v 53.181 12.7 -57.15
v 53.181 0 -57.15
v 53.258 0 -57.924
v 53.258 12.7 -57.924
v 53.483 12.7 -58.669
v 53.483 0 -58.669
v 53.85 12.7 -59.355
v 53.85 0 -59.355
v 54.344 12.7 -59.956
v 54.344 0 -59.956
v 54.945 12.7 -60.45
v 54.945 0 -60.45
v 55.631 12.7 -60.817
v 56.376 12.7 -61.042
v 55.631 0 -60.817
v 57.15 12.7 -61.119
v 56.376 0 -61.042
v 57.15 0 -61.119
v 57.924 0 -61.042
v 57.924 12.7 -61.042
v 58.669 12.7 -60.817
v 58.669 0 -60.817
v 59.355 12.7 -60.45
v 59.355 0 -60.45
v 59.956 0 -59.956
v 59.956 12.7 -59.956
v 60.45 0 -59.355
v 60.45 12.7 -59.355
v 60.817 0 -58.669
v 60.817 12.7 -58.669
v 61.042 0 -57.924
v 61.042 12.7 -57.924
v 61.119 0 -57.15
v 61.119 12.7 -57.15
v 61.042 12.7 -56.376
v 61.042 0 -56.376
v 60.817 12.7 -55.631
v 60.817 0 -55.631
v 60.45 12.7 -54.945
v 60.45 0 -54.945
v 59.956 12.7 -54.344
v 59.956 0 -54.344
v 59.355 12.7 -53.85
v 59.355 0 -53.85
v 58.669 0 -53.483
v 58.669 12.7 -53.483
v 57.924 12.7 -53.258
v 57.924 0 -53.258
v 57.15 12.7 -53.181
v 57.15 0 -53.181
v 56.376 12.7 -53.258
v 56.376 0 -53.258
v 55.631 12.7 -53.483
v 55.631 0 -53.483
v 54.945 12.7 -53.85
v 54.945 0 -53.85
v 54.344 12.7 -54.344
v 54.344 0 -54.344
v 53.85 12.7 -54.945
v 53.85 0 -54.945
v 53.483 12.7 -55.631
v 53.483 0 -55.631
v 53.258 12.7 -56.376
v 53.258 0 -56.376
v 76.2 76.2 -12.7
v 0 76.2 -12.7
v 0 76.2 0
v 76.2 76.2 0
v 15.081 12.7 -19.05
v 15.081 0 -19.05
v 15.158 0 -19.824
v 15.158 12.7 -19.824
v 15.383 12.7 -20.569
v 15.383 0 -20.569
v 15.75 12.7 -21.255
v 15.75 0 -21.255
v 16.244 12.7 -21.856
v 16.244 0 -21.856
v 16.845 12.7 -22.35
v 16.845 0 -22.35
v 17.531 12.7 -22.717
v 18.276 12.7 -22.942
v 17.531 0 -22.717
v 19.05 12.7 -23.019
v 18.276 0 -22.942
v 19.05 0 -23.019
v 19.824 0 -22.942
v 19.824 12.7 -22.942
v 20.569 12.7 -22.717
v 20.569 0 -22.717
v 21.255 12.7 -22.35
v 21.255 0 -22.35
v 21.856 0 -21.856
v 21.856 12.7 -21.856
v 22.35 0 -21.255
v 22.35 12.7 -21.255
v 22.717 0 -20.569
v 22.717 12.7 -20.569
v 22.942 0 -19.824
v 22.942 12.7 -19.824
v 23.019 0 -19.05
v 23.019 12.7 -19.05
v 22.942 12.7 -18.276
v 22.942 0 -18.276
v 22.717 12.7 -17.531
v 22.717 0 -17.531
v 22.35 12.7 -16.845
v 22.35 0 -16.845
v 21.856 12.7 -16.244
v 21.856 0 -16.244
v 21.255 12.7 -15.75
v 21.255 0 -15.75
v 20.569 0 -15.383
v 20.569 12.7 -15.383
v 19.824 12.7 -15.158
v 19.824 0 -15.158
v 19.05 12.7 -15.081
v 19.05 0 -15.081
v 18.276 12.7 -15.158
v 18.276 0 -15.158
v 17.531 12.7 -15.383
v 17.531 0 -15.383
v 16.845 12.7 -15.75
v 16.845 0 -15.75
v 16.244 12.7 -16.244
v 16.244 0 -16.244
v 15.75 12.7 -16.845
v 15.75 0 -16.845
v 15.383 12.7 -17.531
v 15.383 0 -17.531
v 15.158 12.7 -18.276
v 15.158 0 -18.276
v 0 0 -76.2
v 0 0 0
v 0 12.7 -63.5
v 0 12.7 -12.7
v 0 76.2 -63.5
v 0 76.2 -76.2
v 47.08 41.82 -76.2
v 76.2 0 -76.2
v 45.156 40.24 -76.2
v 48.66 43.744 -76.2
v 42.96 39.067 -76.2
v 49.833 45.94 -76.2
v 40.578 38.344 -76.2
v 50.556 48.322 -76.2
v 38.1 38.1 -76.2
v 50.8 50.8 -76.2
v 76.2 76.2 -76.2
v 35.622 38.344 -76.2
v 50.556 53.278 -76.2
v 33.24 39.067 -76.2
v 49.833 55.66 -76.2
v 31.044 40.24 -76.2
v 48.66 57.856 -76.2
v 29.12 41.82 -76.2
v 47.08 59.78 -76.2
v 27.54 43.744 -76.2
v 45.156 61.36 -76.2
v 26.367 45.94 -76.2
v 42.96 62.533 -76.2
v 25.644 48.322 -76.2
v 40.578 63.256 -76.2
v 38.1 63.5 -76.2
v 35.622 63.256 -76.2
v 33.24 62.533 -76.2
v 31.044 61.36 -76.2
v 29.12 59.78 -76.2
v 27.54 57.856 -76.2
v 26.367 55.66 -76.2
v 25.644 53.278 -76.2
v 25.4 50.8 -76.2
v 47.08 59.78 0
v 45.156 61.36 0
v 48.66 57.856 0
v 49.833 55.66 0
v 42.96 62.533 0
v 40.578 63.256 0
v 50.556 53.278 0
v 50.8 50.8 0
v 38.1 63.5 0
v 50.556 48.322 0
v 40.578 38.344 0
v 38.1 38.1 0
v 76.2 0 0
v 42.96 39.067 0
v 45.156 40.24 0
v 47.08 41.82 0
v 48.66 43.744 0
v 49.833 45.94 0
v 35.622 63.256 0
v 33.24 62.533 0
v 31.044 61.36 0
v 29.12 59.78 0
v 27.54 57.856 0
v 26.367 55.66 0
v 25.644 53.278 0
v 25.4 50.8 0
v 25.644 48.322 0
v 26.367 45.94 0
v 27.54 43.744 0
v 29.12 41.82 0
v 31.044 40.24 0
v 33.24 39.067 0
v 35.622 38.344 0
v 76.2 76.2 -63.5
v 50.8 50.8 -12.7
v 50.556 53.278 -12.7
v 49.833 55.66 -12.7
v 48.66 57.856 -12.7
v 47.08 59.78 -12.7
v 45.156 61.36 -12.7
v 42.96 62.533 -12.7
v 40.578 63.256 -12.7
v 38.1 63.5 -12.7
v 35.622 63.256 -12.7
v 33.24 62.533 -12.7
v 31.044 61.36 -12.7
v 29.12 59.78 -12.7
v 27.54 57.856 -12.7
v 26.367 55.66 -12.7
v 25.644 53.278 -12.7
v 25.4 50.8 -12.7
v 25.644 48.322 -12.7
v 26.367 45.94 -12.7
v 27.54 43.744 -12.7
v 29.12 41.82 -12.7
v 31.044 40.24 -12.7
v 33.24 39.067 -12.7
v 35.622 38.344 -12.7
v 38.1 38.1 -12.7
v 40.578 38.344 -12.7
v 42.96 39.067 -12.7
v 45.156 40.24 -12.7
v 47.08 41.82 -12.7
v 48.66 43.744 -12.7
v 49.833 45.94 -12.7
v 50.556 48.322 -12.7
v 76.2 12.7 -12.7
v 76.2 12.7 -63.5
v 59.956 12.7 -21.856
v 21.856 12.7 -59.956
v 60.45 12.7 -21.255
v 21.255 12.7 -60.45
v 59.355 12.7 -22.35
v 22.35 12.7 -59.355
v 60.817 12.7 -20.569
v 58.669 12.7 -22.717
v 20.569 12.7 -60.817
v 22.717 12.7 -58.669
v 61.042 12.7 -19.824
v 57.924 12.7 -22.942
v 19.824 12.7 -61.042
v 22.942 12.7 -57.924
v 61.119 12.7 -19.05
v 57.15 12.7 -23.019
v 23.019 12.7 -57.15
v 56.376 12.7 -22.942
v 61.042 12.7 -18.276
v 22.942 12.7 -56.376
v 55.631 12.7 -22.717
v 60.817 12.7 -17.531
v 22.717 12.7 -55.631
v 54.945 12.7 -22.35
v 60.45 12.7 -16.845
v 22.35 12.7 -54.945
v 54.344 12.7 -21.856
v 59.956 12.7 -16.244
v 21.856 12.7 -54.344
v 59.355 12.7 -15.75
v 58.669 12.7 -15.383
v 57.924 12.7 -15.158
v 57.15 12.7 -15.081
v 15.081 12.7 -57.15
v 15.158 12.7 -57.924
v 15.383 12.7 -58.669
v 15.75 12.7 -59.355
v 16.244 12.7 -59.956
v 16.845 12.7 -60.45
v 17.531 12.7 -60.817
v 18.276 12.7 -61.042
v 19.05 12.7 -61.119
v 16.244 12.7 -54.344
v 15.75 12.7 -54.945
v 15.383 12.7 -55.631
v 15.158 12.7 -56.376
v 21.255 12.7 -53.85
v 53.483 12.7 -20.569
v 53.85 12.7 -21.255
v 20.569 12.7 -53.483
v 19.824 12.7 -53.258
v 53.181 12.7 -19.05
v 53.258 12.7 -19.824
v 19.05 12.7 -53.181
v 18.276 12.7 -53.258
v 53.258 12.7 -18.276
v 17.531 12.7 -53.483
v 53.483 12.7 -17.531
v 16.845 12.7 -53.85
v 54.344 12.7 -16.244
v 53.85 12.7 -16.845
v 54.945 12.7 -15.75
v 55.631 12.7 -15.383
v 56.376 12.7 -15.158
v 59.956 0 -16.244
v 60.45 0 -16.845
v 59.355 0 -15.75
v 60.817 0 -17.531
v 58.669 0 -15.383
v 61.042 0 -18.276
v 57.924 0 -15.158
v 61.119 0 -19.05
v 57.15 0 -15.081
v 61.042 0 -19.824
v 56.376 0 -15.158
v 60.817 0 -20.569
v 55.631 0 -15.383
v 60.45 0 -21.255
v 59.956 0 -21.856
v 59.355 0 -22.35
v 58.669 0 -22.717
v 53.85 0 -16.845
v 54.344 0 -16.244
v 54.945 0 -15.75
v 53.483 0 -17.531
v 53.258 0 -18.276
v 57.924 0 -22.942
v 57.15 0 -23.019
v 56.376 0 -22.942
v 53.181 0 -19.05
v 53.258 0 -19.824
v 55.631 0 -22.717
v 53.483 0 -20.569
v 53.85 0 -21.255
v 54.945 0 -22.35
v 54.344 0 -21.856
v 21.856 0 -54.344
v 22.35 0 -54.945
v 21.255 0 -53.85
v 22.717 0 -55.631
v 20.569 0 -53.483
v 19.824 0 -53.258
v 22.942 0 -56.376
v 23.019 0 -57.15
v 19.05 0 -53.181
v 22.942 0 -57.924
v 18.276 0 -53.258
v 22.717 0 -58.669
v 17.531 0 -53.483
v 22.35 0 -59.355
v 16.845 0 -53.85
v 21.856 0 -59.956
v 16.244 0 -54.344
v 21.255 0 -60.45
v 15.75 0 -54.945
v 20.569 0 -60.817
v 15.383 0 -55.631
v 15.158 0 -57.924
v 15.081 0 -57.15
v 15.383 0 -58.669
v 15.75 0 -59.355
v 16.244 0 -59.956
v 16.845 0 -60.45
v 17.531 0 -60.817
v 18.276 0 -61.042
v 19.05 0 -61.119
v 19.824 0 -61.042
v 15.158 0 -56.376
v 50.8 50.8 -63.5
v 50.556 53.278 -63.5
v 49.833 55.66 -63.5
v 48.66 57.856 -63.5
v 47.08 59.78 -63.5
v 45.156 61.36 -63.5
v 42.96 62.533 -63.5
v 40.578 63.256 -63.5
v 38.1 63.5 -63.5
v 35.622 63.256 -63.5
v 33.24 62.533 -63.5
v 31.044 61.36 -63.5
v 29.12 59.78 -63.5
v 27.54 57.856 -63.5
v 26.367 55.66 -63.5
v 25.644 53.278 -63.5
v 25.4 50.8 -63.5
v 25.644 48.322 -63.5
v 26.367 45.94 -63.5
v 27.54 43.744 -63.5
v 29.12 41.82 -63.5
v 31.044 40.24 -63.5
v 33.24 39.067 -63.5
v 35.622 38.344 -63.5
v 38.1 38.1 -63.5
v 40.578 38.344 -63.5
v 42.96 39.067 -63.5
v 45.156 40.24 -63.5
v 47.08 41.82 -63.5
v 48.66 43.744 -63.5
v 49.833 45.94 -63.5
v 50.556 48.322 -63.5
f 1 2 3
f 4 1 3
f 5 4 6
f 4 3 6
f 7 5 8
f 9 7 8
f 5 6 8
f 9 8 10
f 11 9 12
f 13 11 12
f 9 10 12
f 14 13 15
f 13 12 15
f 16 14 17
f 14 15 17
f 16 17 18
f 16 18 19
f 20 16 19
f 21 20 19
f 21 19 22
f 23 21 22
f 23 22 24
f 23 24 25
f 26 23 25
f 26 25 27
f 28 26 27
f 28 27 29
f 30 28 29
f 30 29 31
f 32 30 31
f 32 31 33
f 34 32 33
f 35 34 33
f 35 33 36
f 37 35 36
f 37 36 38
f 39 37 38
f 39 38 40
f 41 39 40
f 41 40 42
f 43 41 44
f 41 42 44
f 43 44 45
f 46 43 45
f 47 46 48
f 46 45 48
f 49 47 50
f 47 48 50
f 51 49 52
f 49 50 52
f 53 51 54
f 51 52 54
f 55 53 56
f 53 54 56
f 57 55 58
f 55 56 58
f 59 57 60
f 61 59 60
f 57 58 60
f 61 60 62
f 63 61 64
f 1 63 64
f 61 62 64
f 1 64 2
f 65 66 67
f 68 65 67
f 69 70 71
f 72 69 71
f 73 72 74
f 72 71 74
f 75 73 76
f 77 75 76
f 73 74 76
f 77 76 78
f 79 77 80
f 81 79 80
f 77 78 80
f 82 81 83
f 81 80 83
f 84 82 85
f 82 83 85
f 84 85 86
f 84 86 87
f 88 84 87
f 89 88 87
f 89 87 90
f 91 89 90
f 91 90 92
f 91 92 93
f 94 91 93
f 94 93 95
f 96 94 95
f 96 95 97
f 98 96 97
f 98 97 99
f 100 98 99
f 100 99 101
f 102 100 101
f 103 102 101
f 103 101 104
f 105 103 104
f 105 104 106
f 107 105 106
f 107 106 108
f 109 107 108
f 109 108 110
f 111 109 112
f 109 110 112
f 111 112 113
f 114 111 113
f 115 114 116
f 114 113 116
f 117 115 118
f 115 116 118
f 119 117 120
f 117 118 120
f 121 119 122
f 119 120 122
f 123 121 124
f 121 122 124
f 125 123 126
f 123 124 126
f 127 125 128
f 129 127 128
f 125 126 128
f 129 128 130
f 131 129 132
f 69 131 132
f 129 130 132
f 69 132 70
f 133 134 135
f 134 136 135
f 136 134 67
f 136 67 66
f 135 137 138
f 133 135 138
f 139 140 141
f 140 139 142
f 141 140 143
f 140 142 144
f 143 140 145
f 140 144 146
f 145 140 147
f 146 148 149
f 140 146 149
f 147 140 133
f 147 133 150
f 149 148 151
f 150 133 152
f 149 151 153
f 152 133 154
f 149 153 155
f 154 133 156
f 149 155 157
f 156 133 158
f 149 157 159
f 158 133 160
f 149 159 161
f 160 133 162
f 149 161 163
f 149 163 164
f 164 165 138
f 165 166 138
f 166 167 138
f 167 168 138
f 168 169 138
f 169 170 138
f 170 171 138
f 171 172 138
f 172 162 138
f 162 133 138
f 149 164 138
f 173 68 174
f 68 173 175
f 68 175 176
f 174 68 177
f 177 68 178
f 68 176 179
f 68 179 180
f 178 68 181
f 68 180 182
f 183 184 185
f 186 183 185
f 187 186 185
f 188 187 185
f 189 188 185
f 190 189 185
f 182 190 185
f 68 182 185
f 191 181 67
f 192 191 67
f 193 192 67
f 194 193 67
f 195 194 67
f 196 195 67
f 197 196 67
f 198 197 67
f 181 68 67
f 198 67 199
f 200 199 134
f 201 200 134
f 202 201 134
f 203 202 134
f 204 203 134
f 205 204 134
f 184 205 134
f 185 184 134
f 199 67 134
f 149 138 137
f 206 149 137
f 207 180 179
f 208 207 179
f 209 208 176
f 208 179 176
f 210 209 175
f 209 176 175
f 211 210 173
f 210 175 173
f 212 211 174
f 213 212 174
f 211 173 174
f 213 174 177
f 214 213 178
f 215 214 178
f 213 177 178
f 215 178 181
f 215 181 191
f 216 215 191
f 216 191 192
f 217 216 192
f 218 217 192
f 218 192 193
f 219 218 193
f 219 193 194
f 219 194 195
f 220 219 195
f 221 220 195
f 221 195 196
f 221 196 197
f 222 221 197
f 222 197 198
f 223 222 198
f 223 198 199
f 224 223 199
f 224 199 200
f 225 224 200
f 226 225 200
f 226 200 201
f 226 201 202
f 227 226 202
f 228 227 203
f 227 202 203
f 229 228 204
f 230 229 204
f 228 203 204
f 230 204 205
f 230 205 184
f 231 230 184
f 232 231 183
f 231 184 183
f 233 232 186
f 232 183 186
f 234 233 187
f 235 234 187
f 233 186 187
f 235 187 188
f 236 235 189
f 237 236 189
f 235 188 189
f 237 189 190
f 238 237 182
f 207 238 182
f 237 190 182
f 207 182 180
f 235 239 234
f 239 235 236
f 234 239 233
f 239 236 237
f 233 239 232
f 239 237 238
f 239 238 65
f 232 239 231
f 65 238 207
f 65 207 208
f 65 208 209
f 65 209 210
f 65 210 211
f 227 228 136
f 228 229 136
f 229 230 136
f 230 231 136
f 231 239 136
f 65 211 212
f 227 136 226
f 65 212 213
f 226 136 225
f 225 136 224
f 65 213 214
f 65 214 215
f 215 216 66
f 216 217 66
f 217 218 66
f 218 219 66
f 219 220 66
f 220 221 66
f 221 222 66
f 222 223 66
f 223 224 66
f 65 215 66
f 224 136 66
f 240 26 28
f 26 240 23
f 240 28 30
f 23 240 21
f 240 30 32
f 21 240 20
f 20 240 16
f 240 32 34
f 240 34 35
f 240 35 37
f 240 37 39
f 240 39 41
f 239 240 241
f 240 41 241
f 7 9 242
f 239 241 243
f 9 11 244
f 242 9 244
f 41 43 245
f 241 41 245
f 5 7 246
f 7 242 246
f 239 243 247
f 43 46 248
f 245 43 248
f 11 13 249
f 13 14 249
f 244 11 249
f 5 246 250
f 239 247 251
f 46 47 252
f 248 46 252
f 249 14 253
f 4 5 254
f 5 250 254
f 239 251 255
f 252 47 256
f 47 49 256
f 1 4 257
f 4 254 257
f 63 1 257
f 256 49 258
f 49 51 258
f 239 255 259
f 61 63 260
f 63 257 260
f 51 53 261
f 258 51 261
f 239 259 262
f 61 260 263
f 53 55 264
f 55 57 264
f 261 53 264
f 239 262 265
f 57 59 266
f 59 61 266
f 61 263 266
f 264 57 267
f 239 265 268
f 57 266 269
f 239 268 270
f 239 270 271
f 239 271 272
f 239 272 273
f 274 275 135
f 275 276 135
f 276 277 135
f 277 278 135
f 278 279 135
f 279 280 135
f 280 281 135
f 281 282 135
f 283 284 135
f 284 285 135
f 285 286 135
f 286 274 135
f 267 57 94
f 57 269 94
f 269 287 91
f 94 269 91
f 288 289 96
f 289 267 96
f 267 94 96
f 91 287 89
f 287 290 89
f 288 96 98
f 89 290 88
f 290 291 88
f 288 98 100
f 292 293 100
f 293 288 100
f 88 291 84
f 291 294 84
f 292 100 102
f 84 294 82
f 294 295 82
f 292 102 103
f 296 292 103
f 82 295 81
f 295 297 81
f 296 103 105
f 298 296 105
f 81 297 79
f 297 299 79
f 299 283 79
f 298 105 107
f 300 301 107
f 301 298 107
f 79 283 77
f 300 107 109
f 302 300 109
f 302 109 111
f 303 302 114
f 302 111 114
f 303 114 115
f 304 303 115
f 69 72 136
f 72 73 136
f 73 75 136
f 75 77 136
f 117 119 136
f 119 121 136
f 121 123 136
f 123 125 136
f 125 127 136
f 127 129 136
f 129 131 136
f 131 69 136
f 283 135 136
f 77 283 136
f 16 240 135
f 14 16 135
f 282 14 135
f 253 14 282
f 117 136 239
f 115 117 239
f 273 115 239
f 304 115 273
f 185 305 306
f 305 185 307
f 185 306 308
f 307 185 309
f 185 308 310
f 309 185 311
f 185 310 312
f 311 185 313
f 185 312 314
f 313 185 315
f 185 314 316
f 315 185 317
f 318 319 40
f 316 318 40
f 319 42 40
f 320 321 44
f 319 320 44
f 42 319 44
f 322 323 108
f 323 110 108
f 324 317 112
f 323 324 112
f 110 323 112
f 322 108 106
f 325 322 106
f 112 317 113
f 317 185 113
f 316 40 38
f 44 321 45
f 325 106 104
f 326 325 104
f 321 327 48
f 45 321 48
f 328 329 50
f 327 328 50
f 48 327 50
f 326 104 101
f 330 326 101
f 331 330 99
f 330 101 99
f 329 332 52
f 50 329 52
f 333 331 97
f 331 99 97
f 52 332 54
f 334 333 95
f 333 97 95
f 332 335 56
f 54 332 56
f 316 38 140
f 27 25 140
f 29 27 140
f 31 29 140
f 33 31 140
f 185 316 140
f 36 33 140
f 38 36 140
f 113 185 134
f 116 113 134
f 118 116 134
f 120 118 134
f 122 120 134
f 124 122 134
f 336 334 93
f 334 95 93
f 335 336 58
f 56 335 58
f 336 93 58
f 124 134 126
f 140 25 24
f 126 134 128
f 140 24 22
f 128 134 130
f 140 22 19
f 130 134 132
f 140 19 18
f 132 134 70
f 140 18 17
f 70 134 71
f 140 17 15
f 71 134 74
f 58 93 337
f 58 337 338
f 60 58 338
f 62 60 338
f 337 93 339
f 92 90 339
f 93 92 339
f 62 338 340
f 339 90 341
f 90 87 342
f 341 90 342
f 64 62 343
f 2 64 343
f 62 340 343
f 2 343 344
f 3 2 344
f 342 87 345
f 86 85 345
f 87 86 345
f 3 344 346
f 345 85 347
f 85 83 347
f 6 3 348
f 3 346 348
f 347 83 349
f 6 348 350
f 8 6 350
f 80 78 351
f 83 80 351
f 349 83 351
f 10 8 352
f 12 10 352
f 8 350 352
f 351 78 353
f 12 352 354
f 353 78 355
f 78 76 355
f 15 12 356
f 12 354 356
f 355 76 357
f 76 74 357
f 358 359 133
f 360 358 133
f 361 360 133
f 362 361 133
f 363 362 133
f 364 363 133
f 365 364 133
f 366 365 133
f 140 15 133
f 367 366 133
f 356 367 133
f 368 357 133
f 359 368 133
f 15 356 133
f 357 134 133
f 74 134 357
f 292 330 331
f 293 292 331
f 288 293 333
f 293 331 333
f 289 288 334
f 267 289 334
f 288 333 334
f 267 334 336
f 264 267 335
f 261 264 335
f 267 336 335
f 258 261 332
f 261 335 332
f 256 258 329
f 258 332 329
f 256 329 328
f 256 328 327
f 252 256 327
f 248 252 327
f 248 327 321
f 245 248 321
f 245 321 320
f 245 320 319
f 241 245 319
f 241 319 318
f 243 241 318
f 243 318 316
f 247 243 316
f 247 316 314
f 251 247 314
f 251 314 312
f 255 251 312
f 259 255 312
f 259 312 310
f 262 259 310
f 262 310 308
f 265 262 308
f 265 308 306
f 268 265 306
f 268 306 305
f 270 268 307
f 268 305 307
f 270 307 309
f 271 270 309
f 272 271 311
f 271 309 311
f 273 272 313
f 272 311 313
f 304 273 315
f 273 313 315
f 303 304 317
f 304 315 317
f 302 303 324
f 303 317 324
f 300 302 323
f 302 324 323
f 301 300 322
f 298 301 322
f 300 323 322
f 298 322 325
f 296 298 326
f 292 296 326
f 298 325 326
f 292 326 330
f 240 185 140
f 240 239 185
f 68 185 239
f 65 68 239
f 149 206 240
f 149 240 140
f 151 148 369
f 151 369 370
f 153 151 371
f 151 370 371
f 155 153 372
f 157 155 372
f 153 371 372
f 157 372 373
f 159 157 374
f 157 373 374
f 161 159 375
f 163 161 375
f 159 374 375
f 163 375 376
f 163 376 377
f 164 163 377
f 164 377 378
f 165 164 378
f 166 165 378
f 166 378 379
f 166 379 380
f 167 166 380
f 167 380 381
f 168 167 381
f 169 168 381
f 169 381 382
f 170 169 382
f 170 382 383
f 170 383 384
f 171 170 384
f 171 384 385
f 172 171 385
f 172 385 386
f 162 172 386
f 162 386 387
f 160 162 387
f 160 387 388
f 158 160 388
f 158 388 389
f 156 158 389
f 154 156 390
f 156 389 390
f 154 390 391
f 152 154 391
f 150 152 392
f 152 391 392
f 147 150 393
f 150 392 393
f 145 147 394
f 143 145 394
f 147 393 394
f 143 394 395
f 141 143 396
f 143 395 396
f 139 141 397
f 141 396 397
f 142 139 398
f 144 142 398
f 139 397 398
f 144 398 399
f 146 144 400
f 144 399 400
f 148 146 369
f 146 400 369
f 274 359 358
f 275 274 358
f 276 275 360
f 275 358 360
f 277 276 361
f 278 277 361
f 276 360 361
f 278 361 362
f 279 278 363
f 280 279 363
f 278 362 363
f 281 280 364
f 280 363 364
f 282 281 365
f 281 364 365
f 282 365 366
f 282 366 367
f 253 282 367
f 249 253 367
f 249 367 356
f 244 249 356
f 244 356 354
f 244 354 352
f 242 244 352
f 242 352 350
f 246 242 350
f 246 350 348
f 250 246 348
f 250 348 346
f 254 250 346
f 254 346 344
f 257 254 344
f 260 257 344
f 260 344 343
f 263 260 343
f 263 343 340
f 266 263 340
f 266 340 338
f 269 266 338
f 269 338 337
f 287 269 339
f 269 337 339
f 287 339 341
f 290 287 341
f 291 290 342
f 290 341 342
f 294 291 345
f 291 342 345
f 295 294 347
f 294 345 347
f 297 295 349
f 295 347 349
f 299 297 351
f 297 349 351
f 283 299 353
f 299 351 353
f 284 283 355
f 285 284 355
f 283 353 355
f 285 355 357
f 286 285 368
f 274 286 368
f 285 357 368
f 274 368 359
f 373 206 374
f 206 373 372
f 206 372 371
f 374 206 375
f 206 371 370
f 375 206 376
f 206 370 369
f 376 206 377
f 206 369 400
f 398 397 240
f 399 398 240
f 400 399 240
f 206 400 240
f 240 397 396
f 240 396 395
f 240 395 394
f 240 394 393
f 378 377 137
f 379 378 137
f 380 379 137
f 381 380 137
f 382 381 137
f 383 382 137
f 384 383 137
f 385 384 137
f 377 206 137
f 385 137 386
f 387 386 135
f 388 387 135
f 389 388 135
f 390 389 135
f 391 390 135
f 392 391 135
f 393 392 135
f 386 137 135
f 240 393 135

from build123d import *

# Parameters (mm, degrees)
BOSS_EXTRUDE1_DEPTH            = 76.2
SKETCH2_R                      = 12.7
CUT_EXTRUDE1_DEPTH             = 132.982271537
F_5_16_0_3125_DIAMETER_HOLE1_D = 7.9375
LPATTERN1_COUNT                = 2
LPATTERN1_PITCH                = 38.1
LPATTERN1_COUNT_DIR2           = 2
LPATTERN1_PITCH_DIR2           = 38.1


with BuildPart() as part:
    # Sketch1 → Boss-Extrude1 (new body)
    with BuildSketch(Plane(origin=(0, 0, 0), x_dir=(0, 0, -1), z_dir=(1, 0, 0))):
        Polygon((0, 0), (76.2, 0), (76.2, 76.2), (63.5, 76.2), (63.5, 12.7), (12.7, 12.7), (12.7, 76.2), (0, 76.2), align=None)
    extrude(amount=BOSS_EXTRUDE1_DEPTH)

    # Sketch2 → Cut-Extrude1 (cut, through all)
    with BuildSketch(Plane.XY):
        with Locations((38.1, 50.8)):
            Circle(SKETCH2_R)
    extrude(amount=-CUT_EXTRUDE1_DEPTH, mode=Mode.SUBTRACT)

    # 5/16 (0.3125) Diameter Hole1 (through all)
    with Locations(Plane(origin=(0, 12.7, 0), x_dir=(1, 0, 0), z_dir=(0, 1, 0))):
        with Locations((19.05, 19.05)):
            f_5_16_0_3125_diameter_hole1 = Hole(F_5_16_0_3125_DIAMETER_HOLE1_D / 2)

    # LPattern1: 5_16 _0.3125_ Diameter Hole1 2 × 2
    with Locations(*[(i * LPATTERN1_PITCH, 0, -j * LPATTERN1_PITCH_DIR2) for i in range(LPATTERN1_COUNT) for j in range(LPATTERN1_COUNT_DIR2) if (i, j) != (0, 0)]):
        add(f_5_16_0_3125_diameter_hole1, mode=Mode.SUBTRACT)


solid = part.part
